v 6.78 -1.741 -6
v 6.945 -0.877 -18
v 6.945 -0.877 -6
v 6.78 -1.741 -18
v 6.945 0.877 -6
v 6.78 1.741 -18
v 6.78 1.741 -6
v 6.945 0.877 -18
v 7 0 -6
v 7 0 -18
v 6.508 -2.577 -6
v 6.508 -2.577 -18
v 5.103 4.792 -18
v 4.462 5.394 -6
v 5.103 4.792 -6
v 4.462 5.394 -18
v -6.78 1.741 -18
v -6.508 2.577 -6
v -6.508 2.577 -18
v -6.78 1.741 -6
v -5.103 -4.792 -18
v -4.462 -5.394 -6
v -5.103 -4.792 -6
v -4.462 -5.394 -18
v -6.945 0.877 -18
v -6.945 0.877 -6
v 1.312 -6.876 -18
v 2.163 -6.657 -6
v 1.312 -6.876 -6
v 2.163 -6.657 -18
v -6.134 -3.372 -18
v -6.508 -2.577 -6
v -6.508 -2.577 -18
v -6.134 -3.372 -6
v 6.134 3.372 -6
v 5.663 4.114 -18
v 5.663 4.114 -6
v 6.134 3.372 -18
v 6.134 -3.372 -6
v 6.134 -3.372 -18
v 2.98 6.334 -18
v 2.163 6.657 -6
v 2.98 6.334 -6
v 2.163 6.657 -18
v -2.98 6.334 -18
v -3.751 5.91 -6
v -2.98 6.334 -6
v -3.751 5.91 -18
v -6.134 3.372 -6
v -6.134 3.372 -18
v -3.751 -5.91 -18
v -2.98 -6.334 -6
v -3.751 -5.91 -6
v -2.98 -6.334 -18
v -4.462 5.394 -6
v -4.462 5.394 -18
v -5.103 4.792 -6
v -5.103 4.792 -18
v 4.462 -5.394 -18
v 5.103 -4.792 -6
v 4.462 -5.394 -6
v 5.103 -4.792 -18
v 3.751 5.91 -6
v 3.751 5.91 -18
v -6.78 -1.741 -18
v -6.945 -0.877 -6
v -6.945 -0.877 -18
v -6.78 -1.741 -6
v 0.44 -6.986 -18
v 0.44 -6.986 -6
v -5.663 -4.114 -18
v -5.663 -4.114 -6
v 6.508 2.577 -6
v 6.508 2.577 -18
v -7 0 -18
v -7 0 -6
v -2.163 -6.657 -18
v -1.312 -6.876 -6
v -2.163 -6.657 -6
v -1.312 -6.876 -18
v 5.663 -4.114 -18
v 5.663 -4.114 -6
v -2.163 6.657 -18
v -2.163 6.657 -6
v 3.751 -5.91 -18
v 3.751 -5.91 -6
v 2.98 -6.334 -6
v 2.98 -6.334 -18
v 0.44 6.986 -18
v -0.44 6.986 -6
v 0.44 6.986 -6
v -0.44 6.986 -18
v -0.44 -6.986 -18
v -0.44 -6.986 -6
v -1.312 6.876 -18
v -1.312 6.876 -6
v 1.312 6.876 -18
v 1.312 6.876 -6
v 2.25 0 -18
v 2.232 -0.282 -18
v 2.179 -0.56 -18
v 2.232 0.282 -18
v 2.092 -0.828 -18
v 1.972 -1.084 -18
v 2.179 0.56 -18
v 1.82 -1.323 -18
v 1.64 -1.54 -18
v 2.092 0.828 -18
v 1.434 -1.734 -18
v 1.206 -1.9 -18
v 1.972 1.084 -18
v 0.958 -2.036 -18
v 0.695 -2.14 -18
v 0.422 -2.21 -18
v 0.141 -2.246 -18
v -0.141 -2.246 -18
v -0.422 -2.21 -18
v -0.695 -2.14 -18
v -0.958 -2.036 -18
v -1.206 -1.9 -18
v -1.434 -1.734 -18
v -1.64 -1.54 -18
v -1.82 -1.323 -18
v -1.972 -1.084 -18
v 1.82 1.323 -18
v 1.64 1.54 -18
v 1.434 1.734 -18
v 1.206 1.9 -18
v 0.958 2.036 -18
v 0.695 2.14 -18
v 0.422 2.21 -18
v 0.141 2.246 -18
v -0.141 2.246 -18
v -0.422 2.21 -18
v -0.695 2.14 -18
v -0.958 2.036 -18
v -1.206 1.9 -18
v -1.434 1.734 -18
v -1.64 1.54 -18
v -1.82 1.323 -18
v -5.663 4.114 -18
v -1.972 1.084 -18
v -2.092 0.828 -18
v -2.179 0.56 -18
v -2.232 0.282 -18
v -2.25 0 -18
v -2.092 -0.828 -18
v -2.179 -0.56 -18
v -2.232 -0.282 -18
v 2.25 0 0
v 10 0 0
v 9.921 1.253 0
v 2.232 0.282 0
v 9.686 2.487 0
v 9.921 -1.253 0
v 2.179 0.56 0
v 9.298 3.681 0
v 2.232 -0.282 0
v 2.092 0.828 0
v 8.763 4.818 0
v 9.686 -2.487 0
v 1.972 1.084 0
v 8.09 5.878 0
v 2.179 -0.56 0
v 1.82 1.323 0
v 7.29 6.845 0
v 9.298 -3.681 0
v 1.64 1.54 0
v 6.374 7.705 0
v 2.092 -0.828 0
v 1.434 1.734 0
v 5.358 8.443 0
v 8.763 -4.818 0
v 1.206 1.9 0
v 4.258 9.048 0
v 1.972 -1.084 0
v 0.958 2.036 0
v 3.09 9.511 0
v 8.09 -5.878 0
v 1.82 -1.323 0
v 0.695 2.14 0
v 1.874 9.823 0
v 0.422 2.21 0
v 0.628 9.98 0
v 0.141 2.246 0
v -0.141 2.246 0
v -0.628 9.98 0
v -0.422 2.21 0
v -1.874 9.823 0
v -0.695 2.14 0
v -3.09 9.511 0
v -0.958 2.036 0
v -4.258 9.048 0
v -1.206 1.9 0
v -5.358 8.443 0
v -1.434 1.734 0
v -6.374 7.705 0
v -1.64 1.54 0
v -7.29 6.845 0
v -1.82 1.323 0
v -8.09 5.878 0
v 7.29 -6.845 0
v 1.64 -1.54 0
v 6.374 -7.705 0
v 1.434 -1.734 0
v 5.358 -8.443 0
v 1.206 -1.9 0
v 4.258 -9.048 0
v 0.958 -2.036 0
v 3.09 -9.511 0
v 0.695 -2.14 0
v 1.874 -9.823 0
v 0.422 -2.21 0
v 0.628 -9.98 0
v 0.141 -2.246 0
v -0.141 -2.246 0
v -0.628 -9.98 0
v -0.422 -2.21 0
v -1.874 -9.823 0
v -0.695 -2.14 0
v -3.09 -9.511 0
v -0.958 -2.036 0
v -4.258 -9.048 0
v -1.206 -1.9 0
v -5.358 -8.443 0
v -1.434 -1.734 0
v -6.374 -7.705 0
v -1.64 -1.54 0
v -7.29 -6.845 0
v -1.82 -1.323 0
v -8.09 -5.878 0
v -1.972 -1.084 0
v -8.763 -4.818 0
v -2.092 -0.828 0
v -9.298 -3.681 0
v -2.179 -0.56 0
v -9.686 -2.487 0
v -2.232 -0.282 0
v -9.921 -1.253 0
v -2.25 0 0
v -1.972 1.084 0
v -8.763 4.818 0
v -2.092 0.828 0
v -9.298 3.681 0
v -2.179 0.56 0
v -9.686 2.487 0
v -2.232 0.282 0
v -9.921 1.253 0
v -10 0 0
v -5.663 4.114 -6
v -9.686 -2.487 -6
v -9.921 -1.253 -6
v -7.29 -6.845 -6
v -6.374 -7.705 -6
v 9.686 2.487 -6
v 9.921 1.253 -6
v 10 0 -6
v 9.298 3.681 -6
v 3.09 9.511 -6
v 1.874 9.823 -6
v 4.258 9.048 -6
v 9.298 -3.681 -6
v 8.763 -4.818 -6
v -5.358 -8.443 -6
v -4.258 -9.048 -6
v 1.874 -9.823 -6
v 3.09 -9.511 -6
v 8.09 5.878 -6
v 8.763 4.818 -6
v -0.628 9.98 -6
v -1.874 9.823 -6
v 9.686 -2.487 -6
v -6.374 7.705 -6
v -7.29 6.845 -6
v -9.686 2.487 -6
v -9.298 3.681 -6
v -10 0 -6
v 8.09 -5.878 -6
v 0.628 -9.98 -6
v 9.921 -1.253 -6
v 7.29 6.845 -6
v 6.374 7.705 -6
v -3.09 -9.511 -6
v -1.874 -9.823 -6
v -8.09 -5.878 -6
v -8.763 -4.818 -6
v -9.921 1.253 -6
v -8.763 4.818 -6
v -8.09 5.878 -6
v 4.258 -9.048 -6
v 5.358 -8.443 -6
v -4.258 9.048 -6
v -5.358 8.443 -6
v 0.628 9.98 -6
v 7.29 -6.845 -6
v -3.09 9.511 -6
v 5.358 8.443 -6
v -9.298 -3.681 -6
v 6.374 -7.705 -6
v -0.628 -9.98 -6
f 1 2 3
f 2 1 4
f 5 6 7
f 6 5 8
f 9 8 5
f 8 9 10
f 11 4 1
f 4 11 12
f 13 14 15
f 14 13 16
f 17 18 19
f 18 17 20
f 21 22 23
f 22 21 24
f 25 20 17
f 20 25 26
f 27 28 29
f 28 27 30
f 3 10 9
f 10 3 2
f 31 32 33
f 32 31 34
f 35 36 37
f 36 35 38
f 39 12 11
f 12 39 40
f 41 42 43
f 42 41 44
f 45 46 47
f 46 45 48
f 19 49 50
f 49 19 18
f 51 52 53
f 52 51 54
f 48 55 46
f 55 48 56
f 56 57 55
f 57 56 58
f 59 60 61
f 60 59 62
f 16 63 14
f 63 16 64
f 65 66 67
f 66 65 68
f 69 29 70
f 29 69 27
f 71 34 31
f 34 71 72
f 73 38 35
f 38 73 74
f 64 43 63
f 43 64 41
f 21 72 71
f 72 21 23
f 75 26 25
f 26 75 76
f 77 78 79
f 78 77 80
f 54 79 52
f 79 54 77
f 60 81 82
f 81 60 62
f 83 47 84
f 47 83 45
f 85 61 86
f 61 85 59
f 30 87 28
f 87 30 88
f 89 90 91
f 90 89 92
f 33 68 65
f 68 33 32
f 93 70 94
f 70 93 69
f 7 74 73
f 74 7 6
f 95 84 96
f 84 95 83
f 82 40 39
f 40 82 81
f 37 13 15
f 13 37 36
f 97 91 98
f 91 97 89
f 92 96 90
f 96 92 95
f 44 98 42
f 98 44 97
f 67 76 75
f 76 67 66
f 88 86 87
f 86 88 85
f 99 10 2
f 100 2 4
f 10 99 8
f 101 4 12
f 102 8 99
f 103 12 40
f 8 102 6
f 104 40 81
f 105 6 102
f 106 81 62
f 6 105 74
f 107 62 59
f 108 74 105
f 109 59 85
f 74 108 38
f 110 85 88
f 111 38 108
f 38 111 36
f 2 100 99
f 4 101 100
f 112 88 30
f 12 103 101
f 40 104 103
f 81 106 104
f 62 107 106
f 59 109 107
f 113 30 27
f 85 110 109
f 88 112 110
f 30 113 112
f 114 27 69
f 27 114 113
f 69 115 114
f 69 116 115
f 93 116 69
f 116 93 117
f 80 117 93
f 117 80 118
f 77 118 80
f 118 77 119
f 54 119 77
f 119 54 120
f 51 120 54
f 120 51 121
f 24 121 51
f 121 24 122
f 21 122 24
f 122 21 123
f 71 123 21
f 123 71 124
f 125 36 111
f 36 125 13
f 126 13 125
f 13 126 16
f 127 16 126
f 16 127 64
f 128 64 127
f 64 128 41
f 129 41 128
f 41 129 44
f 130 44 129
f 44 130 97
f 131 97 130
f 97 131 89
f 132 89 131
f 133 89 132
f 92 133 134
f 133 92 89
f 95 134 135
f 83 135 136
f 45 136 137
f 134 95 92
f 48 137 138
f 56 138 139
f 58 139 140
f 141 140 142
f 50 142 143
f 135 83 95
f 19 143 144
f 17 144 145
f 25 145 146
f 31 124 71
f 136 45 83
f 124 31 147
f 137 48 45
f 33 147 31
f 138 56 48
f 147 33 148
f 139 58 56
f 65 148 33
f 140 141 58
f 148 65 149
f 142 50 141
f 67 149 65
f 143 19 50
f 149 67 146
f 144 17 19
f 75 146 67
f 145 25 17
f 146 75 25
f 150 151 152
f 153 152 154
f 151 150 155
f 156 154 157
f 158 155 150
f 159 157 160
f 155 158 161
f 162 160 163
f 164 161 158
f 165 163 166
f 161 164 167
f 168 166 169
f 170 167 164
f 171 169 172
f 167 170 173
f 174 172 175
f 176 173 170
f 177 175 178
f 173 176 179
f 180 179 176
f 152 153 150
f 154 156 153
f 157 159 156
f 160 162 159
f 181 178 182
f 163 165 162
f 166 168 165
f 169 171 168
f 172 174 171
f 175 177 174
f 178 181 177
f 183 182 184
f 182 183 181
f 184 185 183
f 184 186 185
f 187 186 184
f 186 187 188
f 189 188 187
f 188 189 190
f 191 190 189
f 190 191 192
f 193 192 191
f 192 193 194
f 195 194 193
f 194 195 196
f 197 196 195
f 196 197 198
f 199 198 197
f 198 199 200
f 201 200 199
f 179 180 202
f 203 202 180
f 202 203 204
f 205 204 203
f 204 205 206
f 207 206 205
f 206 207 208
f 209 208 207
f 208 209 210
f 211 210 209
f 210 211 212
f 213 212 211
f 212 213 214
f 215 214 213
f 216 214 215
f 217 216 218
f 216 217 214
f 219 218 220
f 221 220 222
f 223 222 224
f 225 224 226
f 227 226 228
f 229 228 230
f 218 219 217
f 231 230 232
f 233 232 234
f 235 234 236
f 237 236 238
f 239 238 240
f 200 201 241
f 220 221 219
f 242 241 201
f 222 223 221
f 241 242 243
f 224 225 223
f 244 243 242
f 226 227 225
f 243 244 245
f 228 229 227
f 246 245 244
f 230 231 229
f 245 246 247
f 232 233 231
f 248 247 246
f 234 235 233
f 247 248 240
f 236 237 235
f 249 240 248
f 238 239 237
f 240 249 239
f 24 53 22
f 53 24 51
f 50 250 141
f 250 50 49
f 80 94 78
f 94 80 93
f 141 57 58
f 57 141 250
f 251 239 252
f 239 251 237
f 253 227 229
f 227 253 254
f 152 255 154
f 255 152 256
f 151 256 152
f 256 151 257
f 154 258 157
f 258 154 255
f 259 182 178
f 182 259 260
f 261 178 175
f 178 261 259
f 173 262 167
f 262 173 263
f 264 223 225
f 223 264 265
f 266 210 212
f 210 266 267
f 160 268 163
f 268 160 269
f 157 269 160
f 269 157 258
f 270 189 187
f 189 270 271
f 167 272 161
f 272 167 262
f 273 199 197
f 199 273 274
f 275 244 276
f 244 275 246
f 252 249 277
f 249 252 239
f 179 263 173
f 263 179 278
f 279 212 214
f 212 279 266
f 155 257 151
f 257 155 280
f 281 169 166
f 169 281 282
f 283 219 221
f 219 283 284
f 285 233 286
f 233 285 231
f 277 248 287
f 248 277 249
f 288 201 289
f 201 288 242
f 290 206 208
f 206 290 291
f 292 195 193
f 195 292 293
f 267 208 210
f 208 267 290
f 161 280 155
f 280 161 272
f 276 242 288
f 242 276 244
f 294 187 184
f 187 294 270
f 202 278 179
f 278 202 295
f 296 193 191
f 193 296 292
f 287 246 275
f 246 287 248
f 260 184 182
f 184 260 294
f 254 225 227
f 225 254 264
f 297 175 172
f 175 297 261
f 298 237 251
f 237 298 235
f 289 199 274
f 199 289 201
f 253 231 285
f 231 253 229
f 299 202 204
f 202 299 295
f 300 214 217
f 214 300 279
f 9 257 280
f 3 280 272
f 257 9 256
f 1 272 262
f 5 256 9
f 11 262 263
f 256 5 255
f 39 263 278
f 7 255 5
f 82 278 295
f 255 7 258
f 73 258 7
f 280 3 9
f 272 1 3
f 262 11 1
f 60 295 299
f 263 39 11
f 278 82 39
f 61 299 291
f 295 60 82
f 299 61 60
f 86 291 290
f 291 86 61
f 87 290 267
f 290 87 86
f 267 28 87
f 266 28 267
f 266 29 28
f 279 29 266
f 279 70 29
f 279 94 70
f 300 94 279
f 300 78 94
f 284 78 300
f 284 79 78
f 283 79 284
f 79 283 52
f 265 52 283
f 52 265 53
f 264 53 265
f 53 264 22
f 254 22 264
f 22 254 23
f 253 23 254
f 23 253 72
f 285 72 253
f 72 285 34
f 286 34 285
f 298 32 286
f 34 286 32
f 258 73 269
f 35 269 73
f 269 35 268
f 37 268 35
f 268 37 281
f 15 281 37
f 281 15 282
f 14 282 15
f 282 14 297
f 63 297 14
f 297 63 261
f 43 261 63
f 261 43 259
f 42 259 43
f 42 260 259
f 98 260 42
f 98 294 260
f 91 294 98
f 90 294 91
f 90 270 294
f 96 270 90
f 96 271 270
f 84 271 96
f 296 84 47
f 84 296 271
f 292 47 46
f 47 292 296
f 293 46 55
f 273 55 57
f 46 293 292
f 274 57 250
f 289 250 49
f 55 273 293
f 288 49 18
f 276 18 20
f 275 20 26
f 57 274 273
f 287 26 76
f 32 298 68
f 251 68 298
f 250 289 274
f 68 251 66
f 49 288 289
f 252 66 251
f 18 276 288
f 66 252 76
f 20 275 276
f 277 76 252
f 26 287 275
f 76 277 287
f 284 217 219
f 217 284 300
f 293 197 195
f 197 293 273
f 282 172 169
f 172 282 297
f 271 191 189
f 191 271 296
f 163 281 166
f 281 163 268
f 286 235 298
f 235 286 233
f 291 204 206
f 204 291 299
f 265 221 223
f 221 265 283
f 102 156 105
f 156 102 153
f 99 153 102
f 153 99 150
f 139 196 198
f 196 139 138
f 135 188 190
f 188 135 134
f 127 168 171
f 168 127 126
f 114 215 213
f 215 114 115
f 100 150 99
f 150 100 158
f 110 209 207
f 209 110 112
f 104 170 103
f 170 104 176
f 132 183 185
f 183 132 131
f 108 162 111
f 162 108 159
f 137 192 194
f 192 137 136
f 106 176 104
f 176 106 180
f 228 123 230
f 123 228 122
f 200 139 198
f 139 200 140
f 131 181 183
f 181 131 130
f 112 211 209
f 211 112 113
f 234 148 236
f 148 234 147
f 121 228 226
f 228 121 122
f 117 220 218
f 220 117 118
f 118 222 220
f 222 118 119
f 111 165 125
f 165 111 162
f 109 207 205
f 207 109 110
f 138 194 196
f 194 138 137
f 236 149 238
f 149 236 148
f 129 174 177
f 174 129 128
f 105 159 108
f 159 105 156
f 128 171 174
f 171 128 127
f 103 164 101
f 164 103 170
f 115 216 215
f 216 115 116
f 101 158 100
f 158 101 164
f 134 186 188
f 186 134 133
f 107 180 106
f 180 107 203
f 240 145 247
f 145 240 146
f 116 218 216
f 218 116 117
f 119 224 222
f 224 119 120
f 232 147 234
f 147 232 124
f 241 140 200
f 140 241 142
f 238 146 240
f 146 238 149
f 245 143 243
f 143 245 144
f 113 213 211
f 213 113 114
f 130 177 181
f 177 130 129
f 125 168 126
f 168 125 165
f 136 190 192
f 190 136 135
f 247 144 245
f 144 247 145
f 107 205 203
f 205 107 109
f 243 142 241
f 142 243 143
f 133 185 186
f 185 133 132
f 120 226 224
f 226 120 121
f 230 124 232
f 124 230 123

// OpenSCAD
$fn = 50;


difference() {
	union() {
		translate(v = [0, 0, -18.0000000000]) {
			cylinder(h = 18, r = 7.0000000000);
		}
		translate(v = [0, 0, -6.0000000000]) {
			cylinder(h = 6, r = 10.0000000000);
		}
	}
	union() {
		#translate(v = [0, 0, -18]) {
			cylinder(h = 18, r = 2.2500000000);
		}
	}
}
